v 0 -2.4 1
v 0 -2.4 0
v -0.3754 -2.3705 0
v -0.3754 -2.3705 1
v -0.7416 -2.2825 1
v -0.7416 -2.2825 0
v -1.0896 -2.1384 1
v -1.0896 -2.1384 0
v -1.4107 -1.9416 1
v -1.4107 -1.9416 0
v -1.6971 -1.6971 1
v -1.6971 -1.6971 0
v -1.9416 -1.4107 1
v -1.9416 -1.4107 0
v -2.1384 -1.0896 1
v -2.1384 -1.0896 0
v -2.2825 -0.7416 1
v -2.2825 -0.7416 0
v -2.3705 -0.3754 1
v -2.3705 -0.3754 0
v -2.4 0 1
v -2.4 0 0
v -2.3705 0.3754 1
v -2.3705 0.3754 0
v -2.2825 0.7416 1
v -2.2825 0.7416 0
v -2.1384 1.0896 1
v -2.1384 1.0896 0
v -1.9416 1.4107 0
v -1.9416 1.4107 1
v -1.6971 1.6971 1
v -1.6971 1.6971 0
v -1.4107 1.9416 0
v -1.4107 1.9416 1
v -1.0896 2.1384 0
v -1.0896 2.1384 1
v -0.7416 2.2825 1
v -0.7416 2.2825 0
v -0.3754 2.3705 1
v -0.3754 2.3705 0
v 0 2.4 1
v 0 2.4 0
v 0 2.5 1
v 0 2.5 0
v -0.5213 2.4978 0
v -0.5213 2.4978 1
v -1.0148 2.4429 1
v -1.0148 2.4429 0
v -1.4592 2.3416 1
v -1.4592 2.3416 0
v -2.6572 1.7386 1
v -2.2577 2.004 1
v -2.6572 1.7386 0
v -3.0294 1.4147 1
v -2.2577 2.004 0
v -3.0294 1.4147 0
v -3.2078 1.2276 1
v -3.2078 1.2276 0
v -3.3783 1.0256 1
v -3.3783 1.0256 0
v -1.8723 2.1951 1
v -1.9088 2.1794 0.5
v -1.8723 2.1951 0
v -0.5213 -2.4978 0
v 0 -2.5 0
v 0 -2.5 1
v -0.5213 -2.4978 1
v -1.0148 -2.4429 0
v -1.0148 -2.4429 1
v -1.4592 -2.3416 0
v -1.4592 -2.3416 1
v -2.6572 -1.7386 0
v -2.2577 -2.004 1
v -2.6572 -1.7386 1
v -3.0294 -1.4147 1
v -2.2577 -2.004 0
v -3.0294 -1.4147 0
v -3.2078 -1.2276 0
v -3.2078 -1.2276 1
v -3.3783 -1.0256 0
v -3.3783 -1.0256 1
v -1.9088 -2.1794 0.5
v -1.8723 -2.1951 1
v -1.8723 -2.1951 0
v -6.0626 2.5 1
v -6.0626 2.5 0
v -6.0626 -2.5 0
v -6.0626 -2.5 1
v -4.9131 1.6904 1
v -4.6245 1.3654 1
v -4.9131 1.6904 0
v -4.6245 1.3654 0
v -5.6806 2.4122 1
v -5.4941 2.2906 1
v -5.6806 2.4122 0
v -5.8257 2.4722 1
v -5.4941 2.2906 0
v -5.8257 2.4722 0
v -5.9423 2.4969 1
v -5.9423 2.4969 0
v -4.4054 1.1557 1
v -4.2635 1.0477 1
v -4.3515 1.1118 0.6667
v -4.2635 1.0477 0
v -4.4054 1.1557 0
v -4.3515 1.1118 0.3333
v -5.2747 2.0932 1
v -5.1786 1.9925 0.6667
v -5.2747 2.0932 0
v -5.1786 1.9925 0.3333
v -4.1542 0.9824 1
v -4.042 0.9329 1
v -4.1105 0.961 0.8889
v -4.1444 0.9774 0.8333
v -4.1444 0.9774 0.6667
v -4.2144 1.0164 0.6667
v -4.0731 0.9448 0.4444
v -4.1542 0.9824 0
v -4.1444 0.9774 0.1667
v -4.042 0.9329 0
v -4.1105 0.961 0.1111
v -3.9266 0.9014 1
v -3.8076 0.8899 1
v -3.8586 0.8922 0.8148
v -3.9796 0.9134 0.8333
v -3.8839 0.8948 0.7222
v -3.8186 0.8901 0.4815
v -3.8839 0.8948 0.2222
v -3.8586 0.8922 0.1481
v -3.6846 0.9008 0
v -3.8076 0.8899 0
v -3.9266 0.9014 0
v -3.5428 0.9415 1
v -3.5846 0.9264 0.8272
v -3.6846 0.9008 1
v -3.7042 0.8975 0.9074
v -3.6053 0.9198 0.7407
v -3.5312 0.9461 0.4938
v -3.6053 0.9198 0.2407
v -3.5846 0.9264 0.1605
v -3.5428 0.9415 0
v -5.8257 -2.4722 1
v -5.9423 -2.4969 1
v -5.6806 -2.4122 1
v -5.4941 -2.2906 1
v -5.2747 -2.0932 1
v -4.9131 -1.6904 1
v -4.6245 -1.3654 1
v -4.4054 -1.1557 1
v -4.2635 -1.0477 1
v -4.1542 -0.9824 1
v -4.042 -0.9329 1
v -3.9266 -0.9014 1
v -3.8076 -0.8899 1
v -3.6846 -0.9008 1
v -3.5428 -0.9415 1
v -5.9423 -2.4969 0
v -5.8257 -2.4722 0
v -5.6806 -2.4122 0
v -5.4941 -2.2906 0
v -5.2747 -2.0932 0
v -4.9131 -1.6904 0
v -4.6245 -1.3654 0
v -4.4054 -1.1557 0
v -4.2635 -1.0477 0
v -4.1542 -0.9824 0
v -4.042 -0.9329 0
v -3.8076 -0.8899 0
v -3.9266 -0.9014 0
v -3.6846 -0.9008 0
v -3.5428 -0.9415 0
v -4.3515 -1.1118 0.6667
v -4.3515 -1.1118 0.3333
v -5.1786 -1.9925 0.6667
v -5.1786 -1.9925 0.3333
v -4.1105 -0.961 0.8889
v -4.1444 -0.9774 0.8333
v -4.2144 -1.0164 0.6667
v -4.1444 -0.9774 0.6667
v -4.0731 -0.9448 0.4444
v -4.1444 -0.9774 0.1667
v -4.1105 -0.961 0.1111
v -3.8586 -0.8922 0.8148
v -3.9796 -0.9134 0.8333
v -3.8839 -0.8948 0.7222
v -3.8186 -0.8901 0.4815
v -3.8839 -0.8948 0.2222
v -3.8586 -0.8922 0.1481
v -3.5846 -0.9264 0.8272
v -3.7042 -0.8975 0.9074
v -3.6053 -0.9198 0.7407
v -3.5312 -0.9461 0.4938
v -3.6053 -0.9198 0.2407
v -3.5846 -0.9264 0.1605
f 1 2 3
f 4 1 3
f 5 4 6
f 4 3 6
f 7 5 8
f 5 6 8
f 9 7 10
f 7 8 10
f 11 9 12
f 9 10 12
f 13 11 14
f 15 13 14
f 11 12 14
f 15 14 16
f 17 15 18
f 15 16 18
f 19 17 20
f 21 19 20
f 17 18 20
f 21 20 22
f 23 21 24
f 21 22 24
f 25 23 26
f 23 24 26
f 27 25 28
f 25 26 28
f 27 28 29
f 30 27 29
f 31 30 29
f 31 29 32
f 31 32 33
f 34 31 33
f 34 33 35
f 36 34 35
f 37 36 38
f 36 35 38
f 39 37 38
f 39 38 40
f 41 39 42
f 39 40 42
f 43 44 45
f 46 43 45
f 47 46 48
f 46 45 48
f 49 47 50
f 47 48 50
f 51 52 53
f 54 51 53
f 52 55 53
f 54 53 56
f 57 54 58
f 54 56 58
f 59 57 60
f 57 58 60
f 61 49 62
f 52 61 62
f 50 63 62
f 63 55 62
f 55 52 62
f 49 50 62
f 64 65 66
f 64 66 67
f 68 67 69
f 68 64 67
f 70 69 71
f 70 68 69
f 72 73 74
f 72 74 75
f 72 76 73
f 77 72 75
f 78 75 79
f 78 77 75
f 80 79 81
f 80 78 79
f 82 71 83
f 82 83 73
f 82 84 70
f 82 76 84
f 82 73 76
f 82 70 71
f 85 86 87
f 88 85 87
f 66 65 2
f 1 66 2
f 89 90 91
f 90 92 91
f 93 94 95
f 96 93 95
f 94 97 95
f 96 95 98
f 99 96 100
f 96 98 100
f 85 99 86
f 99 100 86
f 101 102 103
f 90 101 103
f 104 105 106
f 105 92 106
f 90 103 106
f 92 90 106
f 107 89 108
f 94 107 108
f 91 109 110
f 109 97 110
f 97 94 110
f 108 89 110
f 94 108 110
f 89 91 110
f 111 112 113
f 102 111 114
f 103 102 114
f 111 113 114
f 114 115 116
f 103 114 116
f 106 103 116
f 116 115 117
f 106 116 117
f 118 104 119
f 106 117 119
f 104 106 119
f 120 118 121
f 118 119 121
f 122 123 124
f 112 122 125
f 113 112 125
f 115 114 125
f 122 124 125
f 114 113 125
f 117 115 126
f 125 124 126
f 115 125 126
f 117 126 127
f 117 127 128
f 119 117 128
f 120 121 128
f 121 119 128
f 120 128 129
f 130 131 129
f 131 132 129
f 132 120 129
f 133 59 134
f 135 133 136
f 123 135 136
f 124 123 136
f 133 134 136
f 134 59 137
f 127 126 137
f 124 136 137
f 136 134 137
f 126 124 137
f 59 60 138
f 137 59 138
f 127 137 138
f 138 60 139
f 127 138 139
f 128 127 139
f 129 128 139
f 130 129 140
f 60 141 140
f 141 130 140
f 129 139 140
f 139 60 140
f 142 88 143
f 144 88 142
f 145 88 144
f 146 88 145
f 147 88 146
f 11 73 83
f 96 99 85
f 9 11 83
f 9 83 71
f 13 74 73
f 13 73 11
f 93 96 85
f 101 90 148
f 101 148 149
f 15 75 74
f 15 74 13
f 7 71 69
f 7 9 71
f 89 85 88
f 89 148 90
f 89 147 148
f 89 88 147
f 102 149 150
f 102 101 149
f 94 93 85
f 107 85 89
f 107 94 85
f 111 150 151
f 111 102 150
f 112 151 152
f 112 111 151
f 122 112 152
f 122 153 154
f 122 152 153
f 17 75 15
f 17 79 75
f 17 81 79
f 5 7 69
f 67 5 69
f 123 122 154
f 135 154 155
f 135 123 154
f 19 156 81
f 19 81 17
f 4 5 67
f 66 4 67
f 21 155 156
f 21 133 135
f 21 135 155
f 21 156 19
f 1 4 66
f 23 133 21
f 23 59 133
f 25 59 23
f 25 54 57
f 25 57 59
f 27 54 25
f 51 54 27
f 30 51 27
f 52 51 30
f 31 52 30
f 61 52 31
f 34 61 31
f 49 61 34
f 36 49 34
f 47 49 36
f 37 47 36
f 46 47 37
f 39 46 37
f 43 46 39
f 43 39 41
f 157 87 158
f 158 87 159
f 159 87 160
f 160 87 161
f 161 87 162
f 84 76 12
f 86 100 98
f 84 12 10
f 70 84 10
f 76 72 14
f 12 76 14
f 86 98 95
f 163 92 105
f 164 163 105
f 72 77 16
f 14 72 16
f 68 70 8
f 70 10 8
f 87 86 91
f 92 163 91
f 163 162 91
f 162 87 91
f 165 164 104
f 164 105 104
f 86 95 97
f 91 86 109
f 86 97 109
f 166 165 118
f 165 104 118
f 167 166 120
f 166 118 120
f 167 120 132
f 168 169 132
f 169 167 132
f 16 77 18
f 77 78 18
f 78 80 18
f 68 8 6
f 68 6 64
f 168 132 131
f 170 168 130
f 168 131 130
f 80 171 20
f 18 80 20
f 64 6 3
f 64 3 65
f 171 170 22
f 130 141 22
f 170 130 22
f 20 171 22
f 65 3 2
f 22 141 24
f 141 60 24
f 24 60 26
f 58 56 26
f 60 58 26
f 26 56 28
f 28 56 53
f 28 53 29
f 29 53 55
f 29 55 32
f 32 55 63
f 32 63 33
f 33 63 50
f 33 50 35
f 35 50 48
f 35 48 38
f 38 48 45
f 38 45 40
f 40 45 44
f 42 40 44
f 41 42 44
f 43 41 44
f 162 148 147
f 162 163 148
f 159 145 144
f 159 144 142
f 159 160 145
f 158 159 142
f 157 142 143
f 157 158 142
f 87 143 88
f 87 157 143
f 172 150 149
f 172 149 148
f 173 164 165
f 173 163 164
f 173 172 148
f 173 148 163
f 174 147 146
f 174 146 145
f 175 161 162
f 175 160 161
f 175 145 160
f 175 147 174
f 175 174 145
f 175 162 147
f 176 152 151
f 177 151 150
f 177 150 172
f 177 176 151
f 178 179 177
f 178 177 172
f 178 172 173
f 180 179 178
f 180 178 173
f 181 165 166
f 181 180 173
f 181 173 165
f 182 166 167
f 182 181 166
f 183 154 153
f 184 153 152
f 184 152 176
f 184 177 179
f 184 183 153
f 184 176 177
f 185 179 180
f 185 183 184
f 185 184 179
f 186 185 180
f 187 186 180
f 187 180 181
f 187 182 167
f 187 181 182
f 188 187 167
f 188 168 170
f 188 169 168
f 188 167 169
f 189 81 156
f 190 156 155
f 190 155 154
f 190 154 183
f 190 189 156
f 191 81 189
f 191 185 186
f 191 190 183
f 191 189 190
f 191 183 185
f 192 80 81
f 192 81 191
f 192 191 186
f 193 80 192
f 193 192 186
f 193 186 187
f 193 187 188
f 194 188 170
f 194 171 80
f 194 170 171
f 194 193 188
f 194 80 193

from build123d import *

# Parameters (mm, degrees)
BOSS_EXTRUDE1_DEPTH = 1


with BuildPart() as part:
    # Sketch1 → Boss-Extrude1 (new body)
    with BuildSketch(Plane.XY):
        with BuildLine():
            Line((-6.062552239, 2.5), (-6.062552239, -2.5))
            add(Edge.make_bspline(
                [(-3.378314474, -1.025559537), (-4.49216768, -0.325238314), (-5.082460235, -2.568455815), (-6.062552239, -2.5)],
                knots=[0, 0, 0, 0, 1, 1, 1, 1], degree=3))
            add(Edge.make_bspline(
                [(0, -2.5), (-2.128381344, -2.596064875), (-3.378314474, -1.025559537)],
                knots=[0, 0, 0, 1, 1, 1], degree=2))
            Line((0, -2.5), (0, -2.4))
            ThreePointArc((0, -2.4), (-2.4, 0), (0, 2.4))
            Line((0, 2.4), (0, 2.5))
            add(Edge.make_bspline(
                [(0, 2.5), (-2.128381344, 2.596064875), (-3.378314474, 1.025559537)],
                knots=[0, 0, 0, 1, 1, 1], degree=2))
            add(Edge.make_bspline(
                [(-3.378314474, 1.025559537), (-4.49216768, 0.325238314), (-5.082460235, 2.568455815), (-6.062552239, 2.5)],
                knots=[0, 0, 0, 0, 1, 1, 1, 1], degree=3))
        make_face()
    extrude(amount=BOSS_EXTRUDE1_DEPTH)


solid = part.part
